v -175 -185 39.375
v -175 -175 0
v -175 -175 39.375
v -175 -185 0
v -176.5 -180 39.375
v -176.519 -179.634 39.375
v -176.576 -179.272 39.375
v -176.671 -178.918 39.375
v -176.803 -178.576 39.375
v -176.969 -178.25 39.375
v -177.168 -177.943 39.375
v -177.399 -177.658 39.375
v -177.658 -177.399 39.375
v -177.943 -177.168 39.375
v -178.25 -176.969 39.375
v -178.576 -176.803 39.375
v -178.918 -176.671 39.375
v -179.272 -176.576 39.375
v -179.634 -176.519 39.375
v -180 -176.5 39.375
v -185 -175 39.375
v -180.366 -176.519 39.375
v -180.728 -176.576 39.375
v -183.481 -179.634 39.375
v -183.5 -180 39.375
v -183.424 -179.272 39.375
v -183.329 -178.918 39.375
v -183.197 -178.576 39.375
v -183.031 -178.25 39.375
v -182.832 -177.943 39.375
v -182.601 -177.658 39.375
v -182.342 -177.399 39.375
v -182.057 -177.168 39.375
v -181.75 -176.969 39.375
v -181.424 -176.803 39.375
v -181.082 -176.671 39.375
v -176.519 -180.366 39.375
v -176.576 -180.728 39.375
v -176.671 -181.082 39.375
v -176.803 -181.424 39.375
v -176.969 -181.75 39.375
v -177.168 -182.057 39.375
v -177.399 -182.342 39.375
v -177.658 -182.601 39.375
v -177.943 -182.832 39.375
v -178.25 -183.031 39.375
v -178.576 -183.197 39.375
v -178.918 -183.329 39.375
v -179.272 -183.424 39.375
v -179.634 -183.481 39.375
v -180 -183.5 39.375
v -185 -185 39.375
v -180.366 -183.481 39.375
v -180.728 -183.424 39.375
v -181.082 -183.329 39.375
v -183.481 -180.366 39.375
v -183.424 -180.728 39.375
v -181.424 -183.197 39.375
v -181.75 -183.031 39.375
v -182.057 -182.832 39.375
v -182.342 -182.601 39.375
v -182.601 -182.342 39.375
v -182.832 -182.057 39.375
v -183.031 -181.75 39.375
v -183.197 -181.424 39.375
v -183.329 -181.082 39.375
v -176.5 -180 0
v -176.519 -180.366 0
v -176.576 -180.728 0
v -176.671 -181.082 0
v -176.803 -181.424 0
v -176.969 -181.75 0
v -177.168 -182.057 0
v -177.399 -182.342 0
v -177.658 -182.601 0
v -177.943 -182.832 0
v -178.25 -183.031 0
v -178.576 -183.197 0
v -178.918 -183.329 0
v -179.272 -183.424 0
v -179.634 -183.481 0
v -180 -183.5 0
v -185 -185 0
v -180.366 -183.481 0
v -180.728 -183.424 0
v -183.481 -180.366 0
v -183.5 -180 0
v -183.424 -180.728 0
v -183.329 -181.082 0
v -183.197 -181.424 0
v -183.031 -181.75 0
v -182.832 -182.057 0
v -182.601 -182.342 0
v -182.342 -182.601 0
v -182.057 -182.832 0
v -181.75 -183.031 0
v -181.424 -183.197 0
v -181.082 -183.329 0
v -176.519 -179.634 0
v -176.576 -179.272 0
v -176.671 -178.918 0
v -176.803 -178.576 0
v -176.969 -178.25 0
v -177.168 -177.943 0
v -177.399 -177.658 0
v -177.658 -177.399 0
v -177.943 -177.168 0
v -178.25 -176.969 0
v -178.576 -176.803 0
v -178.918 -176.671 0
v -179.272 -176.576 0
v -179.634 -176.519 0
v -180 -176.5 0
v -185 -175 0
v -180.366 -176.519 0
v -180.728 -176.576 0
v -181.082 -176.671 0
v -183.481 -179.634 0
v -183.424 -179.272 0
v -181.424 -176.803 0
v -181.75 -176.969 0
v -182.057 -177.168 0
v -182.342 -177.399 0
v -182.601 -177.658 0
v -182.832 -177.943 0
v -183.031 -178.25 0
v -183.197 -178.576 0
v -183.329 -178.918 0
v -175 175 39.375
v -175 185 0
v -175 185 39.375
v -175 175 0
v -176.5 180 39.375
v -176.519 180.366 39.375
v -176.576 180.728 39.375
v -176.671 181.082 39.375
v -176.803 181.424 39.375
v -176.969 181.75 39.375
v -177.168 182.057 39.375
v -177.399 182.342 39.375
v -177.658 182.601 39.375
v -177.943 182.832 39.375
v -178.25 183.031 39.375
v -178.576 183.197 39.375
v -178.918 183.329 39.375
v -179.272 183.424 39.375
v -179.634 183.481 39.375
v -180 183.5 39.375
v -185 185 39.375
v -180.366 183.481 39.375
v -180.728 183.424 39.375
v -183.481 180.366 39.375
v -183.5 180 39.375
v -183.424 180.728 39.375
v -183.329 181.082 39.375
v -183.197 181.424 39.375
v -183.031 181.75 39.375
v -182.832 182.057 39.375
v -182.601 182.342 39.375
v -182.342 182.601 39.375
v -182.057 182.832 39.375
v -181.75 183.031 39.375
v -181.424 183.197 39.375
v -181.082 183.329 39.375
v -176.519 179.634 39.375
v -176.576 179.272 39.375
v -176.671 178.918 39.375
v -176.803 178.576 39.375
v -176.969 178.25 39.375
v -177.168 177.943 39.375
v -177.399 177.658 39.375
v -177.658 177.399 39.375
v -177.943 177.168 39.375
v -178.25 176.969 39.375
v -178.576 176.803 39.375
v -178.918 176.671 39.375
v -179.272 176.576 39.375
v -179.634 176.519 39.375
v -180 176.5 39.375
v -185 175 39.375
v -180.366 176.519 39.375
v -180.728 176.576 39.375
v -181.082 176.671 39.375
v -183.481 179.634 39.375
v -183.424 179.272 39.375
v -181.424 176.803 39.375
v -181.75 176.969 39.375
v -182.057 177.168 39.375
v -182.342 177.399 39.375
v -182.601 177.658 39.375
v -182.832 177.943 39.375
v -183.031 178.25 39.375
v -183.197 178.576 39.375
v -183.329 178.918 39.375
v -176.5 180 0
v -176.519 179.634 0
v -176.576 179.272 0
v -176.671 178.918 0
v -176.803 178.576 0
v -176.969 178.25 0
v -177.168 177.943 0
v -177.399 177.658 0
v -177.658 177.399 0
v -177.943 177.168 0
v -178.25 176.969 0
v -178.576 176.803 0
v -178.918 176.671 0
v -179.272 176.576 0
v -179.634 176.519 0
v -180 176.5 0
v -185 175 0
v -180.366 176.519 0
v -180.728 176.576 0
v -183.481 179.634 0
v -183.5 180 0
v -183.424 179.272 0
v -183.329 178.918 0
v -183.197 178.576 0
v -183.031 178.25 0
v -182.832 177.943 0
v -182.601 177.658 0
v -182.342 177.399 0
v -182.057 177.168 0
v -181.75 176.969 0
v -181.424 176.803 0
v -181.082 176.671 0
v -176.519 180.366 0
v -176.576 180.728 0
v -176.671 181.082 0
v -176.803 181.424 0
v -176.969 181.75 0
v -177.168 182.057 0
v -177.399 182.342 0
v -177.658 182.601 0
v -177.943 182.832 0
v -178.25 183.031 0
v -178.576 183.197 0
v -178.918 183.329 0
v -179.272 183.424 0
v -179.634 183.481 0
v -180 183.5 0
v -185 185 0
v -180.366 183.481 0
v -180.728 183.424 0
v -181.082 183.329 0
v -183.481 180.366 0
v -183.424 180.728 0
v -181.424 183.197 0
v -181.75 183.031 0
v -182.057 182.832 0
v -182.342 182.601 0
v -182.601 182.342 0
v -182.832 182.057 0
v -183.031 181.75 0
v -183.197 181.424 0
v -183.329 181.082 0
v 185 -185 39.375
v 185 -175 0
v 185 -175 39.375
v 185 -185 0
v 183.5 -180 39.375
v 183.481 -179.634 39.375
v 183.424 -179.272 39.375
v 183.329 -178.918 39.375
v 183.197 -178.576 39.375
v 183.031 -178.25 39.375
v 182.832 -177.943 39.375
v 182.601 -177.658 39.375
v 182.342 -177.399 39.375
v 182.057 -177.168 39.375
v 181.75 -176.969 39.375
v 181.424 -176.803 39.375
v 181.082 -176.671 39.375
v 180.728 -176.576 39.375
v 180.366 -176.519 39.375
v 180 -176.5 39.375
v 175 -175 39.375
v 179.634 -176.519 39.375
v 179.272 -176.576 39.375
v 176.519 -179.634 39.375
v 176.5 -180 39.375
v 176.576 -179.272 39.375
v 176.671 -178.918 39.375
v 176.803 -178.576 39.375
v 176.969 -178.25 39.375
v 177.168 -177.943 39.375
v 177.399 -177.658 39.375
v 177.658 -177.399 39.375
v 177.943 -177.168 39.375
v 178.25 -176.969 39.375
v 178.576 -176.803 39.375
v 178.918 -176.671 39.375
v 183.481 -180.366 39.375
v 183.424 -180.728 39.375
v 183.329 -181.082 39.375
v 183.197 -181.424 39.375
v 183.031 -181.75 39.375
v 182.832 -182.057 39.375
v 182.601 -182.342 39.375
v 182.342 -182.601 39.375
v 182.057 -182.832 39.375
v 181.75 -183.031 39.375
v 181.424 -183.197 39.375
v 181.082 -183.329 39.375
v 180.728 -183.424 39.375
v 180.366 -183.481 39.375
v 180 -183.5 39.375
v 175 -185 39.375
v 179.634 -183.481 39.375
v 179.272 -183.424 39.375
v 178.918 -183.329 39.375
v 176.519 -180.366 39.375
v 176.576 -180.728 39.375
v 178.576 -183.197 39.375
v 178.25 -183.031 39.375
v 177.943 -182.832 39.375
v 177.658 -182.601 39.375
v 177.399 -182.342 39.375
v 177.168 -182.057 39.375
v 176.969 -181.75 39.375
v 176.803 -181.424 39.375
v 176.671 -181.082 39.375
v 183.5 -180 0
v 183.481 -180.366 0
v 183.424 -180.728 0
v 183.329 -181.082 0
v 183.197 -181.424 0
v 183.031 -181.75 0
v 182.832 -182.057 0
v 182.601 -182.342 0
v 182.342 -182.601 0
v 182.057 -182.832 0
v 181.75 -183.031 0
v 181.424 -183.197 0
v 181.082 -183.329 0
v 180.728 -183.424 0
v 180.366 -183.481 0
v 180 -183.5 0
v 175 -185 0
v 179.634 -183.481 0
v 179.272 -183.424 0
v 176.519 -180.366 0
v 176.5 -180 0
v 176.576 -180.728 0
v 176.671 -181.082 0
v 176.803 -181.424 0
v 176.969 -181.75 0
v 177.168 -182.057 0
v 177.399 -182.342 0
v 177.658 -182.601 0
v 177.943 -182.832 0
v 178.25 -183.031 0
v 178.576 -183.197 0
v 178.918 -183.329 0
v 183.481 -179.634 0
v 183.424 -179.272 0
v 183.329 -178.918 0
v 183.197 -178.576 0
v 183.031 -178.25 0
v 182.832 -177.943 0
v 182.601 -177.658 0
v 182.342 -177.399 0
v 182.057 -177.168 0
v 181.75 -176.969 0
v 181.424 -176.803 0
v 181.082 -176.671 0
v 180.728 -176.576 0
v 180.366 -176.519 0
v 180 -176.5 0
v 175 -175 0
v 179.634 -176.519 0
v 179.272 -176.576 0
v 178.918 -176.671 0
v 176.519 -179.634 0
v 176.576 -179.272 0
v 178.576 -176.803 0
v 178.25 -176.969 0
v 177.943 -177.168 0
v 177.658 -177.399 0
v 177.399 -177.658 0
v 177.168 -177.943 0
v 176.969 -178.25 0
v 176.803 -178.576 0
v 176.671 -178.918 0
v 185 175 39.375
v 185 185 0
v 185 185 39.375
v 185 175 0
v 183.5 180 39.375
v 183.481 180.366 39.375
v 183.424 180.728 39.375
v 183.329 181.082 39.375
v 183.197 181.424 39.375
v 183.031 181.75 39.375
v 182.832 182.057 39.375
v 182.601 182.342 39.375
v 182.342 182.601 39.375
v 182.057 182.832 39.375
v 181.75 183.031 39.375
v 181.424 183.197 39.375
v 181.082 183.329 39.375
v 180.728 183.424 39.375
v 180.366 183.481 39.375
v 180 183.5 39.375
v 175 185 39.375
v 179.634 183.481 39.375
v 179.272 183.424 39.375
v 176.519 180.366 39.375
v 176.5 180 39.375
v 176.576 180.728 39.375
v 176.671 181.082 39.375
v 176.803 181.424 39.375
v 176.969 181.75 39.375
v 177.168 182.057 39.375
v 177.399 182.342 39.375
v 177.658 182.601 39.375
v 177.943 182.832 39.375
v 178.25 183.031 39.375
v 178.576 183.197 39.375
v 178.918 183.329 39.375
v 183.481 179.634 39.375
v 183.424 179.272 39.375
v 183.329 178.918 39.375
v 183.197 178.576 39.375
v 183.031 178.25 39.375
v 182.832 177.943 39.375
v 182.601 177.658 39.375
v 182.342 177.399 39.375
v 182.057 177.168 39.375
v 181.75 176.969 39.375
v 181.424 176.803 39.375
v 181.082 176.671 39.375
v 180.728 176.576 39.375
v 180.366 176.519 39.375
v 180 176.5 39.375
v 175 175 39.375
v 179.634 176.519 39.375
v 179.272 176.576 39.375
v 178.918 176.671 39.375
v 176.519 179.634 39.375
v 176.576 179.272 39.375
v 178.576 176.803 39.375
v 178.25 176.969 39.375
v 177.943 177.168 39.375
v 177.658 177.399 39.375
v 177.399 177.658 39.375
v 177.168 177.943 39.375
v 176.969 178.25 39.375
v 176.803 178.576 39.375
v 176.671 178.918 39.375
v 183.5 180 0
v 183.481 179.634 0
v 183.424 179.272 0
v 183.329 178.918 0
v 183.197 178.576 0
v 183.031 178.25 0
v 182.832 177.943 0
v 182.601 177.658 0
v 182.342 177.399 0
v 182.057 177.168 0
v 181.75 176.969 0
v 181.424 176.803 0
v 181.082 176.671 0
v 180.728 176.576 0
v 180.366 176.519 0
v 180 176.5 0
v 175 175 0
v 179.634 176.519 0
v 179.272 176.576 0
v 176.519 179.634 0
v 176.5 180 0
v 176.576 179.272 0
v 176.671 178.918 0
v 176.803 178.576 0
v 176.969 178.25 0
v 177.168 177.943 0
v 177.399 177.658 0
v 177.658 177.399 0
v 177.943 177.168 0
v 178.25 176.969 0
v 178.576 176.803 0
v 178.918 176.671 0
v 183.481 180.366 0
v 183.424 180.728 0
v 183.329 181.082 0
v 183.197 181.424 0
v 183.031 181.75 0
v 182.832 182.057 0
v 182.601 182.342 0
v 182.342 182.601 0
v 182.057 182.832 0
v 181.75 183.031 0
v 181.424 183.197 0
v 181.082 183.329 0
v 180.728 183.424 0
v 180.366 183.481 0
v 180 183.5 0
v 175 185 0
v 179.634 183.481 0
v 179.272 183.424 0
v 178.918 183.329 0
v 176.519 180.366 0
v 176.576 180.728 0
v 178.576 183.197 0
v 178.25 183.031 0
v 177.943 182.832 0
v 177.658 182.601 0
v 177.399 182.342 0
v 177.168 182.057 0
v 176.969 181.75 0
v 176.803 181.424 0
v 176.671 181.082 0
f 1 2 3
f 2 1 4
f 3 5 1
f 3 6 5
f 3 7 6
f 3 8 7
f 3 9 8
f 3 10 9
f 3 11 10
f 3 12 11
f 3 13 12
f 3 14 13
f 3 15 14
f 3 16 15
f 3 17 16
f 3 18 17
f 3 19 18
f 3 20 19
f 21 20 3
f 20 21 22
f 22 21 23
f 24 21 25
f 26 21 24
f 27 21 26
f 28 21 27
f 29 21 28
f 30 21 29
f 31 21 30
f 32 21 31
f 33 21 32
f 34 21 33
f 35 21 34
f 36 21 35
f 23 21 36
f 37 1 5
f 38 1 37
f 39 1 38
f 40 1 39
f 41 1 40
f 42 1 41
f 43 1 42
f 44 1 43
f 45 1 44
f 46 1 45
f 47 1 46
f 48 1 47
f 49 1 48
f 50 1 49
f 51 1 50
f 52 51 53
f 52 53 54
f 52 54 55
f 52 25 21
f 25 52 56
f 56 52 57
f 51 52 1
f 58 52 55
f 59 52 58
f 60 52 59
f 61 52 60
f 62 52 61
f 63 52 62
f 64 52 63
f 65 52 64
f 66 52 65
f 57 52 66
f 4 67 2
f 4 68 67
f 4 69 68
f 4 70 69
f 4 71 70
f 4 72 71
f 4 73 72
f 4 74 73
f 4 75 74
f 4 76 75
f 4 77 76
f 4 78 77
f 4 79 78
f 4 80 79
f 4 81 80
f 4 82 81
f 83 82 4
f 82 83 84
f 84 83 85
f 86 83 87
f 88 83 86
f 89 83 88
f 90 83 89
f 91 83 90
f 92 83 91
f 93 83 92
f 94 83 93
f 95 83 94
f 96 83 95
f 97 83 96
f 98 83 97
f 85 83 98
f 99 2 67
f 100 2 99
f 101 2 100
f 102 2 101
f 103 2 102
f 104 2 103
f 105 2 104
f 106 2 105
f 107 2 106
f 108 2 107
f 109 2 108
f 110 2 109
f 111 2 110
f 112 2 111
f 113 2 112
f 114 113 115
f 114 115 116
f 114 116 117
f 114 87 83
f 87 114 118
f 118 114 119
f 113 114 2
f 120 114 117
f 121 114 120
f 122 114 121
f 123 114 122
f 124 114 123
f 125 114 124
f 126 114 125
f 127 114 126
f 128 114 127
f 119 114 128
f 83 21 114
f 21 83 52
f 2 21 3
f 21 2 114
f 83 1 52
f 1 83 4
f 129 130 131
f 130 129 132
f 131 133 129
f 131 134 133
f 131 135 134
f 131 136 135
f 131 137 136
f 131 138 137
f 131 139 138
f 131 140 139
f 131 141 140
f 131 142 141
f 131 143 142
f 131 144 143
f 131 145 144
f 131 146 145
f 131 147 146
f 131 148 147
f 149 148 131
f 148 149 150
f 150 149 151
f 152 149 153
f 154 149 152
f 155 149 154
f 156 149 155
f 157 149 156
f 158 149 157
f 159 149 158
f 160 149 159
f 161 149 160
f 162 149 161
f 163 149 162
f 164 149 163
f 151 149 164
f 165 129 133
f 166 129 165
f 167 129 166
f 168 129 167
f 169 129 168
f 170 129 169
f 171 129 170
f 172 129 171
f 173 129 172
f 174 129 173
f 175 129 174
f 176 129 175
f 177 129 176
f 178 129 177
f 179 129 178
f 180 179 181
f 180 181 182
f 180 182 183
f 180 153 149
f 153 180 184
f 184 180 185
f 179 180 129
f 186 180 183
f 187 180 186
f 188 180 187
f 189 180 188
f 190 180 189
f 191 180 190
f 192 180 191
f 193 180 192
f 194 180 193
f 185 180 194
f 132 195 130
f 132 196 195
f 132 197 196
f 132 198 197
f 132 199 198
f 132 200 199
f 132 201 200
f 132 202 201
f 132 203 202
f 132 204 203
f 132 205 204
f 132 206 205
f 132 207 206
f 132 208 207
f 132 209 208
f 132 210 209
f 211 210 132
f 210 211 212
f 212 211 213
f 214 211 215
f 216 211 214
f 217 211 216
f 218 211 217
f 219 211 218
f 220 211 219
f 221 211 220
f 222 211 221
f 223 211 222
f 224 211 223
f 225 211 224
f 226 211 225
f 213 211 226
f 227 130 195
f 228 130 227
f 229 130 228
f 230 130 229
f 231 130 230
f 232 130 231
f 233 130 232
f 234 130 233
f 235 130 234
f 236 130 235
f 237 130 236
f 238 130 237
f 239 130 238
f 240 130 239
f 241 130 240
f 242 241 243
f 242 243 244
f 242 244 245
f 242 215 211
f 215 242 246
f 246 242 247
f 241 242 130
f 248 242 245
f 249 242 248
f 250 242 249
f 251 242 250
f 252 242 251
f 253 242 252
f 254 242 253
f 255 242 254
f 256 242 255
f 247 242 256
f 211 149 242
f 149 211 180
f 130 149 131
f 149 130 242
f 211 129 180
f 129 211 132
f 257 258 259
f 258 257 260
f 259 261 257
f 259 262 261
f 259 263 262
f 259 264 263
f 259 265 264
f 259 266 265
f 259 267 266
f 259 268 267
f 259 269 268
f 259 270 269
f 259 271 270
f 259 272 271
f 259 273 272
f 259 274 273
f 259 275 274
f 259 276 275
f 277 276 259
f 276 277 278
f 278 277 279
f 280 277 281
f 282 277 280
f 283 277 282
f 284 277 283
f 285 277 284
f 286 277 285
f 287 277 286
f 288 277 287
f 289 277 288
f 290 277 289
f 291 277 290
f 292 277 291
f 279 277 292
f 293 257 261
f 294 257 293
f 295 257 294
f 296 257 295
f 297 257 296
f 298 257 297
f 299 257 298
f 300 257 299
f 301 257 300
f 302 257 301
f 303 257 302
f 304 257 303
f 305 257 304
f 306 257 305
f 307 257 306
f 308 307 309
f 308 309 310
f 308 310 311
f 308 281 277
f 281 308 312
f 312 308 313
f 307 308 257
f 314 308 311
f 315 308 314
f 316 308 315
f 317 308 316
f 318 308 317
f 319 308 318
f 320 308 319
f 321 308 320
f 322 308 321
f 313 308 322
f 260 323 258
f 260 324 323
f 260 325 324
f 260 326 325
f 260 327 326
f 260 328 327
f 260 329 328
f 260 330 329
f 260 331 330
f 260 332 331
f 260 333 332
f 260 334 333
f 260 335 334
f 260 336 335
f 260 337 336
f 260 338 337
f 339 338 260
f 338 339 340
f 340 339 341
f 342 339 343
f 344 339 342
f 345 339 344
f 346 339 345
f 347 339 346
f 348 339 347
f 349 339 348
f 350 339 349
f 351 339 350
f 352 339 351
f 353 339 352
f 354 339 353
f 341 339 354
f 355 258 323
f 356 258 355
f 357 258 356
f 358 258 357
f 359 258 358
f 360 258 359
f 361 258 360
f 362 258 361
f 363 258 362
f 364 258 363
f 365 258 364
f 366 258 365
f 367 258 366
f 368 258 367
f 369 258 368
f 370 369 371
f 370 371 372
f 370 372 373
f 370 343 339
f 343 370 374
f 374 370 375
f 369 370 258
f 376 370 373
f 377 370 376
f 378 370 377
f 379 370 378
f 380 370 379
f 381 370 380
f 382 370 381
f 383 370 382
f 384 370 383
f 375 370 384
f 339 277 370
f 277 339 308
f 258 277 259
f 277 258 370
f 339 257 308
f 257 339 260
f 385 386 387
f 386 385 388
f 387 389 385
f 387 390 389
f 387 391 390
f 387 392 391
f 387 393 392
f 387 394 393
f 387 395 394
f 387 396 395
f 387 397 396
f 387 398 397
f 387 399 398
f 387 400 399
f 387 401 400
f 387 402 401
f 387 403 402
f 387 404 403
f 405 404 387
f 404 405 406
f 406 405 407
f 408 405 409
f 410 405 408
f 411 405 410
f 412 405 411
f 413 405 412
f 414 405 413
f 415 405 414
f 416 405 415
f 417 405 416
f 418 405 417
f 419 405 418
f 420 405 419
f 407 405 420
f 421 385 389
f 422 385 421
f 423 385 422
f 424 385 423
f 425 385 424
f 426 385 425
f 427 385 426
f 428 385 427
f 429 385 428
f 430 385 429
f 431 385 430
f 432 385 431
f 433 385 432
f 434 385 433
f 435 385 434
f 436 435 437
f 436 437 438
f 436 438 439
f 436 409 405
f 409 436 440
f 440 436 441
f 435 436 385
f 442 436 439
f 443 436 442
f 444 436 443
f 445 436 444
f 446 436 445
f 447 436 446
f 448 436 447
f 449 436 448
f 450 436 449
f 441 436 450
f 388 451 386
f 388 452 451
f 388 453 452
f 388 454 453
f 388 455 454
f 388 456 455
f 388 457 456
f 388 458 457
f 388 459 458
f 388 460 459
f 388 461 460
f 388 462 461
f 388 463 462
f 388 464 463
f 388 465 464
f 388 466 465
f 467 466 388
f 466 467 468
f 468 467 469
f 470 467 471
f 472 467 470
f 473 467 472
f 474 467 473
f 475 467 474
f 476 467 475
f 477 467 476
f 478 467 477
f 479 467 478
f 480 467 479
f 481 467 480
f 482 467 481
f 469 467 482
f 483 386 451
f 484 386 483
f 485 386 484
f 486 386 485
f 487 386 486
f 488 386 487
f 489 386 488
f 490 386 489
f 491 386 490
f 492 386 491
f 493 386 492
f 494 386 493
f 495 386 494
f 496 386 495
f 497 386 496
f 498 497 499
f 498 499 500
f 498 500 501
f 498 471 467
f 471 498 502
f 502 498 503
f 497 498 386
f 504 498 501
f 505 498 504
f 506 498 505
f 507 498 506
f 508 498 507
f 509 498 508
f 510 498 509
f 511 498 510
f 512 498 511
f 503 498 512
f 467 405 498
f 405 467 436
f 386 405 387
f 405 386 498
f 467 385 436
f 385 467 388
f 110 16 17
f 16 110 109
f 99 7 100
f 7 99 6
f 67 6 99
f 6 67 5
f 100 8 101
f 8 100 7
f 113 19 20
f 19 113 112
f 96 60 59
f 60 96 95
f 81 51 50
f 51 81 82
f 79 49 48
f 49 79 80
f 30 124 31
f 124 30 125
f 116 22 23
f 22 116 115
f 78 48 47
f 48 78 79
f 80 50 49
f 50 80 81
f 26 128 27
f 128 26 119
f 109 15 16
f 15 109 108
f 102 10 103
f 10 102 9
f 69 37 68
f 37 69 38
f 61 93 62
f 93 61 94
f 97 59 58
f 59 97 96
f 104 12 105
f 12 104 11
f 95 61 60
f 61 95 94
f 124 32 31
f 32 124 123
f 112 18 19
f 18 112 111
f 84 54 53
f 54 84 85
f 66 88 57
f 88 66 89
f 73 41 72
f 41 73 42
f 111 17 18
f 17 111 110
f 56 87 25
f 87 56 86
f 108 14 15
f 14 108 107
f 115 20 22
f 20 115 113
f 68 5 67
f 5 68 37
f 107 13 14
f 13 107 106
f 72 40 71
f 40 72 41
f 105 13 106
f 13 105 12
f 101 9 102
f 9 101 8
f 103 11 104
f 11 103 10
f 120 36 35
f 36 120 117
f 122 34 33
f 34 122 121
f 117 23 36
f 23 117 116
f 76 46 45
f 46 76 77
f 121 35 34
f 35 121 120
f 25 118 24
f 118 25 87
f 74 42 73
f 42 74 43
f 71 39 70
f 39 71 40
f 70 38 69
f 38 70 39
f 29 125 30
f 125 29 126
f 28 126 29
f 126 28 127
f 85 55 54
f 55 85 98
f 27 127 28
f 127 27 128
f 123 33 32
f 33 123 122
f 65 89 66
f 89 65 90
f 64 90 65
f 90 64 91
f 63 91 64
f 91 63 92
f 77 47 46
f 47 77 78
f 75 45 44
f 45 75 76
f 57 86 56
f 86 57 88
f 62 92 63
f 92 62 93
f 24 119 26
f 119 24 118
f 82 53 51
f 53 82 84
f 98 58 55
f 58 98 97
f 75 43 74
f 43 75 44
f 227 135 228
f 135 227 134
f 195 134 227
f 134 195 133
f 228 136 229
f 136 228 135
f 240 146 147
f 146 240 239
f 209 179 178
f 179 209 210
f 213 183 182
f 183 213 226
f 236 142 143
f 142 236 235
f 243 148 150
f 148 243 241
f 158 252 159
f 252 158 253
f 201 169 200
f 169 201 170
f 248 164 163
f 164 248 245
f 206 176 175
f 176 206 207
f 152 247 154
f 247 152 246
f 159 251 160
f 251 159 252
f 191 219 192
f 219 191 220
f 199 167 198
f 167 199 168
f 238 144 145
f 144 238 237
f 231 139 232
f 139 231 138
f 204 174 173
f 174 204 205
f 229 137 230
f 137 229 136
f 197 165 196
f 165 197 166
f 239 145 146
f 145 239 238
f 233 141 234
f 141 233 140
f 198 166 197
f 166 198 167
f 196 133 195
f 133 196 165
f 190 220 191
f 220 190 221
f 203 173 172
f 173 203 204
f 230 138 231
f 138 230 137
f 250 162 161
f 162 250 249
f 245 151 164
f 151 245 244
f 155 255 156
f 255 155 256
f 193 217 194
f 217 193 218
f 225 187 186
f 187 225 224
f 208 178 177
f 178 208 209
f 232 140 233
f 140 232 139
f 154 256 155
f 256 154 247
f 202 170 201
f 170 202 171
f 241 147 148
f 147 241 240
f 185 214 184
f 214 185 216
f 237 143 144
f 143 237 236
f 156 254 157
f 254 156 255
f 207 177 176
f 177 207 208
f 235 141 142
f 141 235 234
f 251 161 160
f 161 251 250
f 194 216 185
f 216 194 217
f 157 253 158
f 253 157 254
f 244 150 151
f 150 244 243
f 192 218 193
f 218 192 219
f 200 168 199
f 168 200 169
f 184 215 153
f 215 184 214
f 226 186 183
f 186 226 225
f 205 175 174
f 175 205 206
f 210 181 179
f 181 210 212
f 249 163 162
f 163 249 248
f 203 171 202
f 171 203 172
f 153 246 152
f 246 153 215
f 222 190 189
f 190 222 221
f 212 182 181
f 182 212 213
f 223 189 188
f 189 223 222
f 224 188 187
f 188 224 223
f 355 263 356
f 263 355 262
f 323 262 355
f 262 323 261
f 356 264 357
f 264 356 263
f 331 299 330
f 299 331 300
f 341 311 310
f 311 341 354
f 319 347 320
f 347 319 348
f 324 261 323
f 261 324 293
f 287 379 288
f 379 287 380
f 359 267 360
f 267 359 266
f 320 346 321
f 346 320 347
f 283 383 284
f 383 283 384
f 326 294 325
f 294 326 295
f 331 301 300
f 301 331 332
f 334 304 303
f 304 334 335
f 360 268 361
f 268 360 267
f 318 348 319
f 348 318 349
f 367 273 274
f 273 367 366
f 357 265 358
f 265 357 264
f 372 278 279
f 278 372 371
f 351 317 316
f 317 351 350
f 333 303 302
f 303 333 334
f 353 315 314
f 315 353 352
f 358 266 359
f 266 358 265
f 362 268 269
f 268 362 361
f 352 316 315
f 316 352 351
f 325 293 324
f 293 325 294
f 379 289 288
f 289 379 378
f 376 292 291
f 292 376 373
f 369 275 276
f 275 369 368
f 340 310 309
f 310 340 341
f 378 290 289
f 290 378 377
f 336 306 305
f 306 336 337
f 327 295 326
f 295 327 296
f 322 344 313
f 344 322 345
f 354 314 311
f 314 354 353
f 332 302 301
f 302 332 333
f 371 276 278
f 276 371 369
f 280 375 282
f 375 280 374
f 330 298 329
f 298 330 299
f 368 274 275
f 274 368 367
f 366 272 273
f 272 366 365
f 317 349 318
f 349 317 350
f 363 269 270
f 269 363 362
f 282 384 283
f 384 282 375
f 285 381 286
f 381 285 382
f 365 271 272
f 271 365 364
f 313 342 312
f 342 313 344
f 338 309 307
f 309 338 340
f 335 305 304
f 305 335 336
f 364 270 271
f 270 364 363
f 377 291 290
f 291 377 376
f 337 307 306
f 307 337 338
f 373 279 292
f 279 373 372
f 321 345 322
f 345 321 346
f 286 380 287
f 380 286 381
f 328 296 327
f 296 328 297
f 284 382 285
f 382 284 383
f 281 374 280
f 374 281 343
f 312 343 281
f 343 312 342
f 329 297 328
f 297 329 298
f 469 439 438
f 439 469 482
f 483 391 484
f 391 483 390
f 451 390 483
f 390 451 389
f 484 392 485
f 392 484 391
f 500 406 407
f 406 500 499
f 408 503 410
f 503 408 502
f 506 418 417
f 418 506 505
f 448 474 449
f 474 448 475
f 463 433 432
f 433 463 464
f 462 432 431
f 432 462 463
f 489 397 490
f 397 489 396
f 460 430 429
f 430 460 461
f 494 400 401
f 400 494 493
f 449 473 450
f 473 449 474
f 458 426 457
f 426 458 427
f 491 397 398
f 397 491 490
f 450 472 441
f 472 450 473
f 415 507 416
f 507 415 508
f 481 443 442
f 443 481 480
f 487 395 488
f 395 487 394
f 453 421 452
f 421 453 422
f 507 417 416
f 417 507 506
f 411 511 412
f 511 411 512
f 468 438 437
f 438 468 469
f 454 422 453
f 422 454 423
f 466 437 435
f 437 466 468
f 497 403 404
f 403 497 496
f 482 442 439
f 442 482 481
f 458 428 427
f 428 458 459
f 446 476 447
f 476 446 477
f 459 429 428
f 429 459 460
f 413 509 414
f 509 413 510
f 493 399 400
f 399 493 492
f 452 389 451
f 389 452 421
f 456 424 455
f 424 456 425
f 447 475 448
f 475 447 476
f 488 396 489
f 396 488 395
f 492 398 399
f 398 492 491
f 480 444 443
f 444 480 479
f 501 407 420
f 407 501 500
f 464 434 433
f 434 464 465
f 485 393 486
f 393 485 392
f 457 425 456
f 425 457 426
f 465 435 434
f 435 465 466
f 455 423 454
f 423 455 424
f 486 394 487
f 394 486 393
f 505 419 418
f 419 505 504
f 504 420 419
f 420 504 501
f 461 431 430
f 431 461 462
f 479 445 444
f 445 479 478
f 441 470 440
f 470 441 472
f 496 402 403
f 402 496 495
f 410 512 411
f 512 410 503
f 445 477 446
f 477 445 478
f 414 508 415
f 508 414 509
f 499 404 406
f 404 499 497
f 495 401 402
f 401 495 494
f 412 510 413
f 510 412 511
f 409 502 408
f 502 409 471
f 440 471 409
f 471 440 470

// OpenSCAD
$fn=60;
module spacer_layer() {
    h = 39.375;
    difference() {
        union() {
            for (x = [-180, 180]) {
                for (y = [-180, 180]) {
                    translate([x - 5, y - 5, 0]) cube([10, 10, h]);
                }
            }
        }
        for (x = [-180, 180]) {
            for (y = [-180, 180]) {
                translate([x, y, -1]) cylinder(d=7, h=h + 2);
            }
        }
    }
}
spacer_layer();
